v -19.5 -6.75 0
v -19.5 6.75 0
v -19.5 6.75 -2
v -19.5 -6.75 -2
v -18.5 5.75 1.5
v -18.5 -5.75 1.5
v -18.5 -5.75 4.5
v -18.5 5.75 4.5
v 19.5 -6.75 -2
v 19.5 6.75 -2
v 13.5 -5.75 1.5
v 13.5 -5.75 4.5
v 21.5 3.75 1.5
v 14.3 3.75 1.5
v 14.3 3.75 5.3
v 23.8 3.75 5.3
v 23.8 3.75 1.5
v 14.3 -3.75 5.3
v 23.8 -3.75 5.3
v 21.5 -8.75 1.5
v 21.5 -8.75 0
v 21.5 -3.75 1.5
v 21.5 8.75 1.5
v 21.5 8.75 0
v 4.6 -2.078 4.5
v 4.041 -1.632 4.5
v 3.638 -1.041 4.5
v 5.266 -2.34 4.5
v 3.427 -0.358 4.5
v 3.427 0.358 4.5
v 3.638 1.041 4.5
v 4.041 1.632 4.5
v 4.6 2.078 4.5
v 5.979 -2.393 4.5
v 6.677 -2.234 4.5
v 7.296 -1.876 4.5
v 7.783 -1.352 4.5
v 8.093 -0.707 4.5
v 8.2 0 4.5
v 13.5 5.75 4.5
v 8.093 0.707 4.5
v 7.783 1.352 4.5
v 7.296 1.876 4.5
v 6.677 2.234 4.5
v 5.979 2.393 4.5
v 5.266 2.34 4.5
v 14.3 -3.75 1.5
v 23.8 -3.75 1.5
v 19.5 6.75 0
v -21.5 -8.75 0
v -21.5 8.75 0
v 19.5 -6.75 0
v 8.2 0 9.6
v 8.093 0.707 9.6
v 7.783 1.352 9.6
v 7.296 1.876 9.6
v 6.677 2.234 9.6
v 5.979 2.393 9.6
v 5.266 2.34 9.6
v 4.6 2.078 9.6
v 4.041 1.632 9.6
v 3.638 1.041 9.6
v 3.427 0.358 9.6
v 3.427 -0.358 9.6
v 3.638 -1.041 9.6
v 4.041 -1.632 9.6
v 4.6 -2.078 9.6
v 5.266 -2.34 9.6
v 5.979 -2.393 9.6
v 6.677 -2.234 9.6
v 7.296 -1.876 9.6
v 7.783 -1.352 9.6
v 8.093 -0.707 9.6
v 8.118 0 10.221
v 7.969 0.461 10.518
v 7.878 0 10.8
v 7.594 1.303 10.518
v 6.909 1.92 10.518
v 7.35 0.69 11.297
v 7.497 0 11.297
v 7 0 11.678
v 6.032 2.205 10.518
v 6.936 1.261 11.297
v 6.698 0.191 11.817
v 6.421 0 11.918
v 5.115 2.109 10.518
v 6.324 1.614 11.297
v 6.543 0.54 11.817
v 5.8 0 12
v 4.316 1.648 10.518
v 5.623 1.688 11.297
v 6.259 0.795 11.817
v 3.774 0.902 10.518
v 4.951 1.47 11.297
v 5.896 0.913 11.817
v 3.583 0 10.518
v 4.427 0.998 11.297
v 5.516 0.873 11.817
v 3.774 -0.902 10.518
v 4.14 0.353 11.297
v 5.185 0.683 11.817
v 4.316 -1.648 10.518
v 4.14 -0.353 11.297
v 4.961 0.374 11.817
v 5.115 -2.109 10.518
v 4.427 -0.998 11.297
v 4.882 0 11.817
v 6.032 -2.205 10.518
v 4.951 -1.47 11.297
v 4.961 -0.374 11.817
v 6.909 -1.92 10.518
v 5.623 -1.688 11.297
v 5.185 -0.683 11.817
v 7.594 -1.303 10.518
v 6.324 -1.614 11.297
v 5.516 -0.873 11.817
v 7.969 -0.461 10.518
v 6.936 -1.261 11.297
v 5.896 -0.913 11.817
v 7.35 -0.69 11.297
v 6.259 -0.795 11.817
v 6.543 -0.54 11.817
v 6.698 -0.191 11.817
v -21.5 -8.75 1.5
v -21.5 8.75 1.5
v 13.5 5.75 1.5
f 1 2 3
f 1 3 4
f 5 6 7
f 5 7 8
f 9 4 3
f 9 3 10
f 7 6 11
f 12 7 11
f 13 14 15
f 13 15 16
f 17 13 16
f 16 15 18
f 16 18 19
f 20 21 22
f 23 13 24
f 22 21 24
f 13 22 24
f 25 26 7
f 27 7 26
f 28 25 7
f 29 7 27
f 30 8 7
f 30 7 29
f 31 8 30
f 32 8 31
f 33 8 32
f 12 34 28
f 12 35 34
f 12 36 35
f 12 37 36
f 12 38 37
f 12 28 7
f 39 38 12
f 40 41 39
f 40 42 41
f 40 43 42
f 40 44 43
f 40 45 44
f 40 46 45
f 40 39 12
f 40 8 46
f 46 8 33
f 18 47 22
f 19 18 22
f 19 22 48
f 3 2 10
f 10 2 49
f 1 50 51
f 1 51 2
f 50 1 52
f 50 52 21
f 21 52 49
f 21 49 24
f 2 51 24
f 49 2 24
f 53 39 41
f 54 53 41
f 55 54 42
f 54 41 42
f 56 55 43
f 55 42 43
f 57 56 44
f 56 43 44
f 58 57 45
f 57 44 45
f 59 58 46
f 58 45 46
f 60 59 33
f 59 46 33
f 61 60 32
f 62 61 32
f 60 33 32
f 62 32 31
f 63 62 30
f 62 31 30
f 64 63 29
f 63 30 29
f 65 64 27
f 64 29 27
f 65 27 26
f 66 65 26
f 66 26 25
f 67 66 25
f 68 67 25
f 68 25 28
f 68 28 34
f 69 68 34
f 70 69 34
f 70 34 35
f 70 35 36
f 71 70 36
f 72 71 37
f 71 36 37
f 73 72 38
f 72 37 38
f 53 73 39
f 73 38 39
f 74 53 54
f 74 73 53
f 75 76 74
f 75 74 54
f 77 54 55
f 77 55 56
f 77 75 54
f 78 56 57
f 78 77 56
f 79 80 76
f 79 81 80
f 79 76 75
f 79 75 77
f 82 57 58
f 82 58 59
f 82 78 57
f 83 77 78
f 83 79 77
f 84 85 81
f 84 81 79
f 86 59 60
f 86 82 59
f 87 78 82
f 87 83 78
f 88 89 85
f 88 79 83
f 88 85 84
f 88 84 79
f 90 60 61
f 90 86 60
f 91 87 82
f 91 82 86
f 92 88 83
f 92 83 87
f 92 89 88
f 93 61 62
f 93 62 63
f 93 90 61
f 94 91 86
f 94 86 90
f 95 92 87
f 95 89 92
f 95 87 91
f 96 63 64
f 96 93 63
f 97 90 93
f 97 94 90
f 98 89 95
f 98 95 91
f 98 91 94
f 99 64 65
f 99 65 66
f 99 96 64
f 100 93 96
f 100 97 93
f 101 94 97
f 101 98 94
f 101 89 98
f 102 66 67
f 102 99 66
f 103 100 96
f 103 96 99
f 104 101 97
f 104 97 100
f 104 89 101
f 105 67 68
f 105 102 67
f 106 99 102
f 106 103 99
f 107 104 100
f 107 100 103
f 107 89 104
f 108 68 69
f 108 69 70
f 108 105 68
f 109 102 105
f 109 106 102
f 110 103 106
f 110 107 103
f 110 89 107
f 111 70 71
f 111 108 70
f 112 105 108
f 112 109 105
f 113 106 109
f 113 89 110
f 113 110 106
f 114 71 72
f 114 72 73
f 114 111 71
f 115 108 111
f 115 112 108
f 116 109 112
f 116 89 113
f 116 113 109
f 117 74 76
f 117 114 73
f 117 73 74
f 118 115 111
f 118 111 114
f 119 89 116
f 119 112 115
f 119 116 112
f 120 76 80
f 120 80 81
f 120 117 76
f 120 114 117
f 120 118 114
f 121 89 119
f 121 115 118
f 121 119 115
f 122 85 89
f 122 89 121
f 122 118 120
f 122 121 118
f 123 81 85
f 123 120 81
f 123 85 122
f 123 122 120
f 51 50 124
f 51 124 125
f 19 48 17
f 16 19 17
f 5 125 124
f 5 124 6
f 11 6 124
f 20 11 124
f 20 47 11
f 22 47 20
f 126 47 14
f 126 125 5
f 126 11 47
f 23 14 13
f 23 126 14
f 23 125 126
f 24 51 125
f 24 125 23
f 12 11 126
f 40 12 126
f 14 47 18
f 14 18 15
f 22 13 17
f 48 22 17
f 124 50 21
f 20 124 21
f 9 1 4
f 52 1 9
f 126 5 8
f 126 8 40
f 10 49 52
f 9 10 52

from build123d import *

# Parameters (mm, degrees)
F0_W     = 43
F0_H     = 17.5
F1_DEPTH = 1.5
F2_W     = 9.5
F2_H     = 7.5
F3_DEPTH = 3.8
F4_W     = 32
F4_H     = 11.5
F5_DEPTH = 3
F6_W     = 39
F6_H     = 13.5
F7_DEPTH = 2
F8_R     = 2.4
F9_DEPTH = 7.5
F10_R    = 2.4


with BuildPart() as f1:
    # F0 (on Top) → F1 (new body)
    with BuildSketch(Plane.XY):
        Rectangle(F0_W, F0_H)
    extrude(amount=F1_DEPTH)

    # F2 (on face) → F3 (join)
    with BuildSketch(Plane.XY.offset(1.5)):
        with Locations((19.05, 0)):
            Rectangle(F2_W, F2_H)
    extrude(amount=F3_DEPTH)

    # F4 (on face) → F5 (join)
    with BuildSketch(Plane.XY.offset(1.5)):
        with Locations((-2.5, 0)):
            Rectangle(F4_W, F4_H)
    extrude(amount=F5_DEPTH)

    # F6 (on face) → F7 (join)
    with BuildSketch(Plane(origin=(0, 0, 0), x_dir=(1, 0, 0), z_dir=(0, 0, -1))):
        Rectangle(F6_W, F6_H)
    extrude(amount=F7_DEPTH)

    # F8 (on face) → F9 (join)
    with BuildSketch(Plane.XY.offset(4.5)):
        with Locations((5.8, 0)):
            Circle(F8_R)
    extrude(amount=F9_DEPTH)

    # F10
    f10_edges = [f1.edges().sort_by_distance(p)[0] for p in [
        (3.4, 0, 12),
    ]]
    fillet(f10_edges, radius=F10_R)


solid = f1.part
